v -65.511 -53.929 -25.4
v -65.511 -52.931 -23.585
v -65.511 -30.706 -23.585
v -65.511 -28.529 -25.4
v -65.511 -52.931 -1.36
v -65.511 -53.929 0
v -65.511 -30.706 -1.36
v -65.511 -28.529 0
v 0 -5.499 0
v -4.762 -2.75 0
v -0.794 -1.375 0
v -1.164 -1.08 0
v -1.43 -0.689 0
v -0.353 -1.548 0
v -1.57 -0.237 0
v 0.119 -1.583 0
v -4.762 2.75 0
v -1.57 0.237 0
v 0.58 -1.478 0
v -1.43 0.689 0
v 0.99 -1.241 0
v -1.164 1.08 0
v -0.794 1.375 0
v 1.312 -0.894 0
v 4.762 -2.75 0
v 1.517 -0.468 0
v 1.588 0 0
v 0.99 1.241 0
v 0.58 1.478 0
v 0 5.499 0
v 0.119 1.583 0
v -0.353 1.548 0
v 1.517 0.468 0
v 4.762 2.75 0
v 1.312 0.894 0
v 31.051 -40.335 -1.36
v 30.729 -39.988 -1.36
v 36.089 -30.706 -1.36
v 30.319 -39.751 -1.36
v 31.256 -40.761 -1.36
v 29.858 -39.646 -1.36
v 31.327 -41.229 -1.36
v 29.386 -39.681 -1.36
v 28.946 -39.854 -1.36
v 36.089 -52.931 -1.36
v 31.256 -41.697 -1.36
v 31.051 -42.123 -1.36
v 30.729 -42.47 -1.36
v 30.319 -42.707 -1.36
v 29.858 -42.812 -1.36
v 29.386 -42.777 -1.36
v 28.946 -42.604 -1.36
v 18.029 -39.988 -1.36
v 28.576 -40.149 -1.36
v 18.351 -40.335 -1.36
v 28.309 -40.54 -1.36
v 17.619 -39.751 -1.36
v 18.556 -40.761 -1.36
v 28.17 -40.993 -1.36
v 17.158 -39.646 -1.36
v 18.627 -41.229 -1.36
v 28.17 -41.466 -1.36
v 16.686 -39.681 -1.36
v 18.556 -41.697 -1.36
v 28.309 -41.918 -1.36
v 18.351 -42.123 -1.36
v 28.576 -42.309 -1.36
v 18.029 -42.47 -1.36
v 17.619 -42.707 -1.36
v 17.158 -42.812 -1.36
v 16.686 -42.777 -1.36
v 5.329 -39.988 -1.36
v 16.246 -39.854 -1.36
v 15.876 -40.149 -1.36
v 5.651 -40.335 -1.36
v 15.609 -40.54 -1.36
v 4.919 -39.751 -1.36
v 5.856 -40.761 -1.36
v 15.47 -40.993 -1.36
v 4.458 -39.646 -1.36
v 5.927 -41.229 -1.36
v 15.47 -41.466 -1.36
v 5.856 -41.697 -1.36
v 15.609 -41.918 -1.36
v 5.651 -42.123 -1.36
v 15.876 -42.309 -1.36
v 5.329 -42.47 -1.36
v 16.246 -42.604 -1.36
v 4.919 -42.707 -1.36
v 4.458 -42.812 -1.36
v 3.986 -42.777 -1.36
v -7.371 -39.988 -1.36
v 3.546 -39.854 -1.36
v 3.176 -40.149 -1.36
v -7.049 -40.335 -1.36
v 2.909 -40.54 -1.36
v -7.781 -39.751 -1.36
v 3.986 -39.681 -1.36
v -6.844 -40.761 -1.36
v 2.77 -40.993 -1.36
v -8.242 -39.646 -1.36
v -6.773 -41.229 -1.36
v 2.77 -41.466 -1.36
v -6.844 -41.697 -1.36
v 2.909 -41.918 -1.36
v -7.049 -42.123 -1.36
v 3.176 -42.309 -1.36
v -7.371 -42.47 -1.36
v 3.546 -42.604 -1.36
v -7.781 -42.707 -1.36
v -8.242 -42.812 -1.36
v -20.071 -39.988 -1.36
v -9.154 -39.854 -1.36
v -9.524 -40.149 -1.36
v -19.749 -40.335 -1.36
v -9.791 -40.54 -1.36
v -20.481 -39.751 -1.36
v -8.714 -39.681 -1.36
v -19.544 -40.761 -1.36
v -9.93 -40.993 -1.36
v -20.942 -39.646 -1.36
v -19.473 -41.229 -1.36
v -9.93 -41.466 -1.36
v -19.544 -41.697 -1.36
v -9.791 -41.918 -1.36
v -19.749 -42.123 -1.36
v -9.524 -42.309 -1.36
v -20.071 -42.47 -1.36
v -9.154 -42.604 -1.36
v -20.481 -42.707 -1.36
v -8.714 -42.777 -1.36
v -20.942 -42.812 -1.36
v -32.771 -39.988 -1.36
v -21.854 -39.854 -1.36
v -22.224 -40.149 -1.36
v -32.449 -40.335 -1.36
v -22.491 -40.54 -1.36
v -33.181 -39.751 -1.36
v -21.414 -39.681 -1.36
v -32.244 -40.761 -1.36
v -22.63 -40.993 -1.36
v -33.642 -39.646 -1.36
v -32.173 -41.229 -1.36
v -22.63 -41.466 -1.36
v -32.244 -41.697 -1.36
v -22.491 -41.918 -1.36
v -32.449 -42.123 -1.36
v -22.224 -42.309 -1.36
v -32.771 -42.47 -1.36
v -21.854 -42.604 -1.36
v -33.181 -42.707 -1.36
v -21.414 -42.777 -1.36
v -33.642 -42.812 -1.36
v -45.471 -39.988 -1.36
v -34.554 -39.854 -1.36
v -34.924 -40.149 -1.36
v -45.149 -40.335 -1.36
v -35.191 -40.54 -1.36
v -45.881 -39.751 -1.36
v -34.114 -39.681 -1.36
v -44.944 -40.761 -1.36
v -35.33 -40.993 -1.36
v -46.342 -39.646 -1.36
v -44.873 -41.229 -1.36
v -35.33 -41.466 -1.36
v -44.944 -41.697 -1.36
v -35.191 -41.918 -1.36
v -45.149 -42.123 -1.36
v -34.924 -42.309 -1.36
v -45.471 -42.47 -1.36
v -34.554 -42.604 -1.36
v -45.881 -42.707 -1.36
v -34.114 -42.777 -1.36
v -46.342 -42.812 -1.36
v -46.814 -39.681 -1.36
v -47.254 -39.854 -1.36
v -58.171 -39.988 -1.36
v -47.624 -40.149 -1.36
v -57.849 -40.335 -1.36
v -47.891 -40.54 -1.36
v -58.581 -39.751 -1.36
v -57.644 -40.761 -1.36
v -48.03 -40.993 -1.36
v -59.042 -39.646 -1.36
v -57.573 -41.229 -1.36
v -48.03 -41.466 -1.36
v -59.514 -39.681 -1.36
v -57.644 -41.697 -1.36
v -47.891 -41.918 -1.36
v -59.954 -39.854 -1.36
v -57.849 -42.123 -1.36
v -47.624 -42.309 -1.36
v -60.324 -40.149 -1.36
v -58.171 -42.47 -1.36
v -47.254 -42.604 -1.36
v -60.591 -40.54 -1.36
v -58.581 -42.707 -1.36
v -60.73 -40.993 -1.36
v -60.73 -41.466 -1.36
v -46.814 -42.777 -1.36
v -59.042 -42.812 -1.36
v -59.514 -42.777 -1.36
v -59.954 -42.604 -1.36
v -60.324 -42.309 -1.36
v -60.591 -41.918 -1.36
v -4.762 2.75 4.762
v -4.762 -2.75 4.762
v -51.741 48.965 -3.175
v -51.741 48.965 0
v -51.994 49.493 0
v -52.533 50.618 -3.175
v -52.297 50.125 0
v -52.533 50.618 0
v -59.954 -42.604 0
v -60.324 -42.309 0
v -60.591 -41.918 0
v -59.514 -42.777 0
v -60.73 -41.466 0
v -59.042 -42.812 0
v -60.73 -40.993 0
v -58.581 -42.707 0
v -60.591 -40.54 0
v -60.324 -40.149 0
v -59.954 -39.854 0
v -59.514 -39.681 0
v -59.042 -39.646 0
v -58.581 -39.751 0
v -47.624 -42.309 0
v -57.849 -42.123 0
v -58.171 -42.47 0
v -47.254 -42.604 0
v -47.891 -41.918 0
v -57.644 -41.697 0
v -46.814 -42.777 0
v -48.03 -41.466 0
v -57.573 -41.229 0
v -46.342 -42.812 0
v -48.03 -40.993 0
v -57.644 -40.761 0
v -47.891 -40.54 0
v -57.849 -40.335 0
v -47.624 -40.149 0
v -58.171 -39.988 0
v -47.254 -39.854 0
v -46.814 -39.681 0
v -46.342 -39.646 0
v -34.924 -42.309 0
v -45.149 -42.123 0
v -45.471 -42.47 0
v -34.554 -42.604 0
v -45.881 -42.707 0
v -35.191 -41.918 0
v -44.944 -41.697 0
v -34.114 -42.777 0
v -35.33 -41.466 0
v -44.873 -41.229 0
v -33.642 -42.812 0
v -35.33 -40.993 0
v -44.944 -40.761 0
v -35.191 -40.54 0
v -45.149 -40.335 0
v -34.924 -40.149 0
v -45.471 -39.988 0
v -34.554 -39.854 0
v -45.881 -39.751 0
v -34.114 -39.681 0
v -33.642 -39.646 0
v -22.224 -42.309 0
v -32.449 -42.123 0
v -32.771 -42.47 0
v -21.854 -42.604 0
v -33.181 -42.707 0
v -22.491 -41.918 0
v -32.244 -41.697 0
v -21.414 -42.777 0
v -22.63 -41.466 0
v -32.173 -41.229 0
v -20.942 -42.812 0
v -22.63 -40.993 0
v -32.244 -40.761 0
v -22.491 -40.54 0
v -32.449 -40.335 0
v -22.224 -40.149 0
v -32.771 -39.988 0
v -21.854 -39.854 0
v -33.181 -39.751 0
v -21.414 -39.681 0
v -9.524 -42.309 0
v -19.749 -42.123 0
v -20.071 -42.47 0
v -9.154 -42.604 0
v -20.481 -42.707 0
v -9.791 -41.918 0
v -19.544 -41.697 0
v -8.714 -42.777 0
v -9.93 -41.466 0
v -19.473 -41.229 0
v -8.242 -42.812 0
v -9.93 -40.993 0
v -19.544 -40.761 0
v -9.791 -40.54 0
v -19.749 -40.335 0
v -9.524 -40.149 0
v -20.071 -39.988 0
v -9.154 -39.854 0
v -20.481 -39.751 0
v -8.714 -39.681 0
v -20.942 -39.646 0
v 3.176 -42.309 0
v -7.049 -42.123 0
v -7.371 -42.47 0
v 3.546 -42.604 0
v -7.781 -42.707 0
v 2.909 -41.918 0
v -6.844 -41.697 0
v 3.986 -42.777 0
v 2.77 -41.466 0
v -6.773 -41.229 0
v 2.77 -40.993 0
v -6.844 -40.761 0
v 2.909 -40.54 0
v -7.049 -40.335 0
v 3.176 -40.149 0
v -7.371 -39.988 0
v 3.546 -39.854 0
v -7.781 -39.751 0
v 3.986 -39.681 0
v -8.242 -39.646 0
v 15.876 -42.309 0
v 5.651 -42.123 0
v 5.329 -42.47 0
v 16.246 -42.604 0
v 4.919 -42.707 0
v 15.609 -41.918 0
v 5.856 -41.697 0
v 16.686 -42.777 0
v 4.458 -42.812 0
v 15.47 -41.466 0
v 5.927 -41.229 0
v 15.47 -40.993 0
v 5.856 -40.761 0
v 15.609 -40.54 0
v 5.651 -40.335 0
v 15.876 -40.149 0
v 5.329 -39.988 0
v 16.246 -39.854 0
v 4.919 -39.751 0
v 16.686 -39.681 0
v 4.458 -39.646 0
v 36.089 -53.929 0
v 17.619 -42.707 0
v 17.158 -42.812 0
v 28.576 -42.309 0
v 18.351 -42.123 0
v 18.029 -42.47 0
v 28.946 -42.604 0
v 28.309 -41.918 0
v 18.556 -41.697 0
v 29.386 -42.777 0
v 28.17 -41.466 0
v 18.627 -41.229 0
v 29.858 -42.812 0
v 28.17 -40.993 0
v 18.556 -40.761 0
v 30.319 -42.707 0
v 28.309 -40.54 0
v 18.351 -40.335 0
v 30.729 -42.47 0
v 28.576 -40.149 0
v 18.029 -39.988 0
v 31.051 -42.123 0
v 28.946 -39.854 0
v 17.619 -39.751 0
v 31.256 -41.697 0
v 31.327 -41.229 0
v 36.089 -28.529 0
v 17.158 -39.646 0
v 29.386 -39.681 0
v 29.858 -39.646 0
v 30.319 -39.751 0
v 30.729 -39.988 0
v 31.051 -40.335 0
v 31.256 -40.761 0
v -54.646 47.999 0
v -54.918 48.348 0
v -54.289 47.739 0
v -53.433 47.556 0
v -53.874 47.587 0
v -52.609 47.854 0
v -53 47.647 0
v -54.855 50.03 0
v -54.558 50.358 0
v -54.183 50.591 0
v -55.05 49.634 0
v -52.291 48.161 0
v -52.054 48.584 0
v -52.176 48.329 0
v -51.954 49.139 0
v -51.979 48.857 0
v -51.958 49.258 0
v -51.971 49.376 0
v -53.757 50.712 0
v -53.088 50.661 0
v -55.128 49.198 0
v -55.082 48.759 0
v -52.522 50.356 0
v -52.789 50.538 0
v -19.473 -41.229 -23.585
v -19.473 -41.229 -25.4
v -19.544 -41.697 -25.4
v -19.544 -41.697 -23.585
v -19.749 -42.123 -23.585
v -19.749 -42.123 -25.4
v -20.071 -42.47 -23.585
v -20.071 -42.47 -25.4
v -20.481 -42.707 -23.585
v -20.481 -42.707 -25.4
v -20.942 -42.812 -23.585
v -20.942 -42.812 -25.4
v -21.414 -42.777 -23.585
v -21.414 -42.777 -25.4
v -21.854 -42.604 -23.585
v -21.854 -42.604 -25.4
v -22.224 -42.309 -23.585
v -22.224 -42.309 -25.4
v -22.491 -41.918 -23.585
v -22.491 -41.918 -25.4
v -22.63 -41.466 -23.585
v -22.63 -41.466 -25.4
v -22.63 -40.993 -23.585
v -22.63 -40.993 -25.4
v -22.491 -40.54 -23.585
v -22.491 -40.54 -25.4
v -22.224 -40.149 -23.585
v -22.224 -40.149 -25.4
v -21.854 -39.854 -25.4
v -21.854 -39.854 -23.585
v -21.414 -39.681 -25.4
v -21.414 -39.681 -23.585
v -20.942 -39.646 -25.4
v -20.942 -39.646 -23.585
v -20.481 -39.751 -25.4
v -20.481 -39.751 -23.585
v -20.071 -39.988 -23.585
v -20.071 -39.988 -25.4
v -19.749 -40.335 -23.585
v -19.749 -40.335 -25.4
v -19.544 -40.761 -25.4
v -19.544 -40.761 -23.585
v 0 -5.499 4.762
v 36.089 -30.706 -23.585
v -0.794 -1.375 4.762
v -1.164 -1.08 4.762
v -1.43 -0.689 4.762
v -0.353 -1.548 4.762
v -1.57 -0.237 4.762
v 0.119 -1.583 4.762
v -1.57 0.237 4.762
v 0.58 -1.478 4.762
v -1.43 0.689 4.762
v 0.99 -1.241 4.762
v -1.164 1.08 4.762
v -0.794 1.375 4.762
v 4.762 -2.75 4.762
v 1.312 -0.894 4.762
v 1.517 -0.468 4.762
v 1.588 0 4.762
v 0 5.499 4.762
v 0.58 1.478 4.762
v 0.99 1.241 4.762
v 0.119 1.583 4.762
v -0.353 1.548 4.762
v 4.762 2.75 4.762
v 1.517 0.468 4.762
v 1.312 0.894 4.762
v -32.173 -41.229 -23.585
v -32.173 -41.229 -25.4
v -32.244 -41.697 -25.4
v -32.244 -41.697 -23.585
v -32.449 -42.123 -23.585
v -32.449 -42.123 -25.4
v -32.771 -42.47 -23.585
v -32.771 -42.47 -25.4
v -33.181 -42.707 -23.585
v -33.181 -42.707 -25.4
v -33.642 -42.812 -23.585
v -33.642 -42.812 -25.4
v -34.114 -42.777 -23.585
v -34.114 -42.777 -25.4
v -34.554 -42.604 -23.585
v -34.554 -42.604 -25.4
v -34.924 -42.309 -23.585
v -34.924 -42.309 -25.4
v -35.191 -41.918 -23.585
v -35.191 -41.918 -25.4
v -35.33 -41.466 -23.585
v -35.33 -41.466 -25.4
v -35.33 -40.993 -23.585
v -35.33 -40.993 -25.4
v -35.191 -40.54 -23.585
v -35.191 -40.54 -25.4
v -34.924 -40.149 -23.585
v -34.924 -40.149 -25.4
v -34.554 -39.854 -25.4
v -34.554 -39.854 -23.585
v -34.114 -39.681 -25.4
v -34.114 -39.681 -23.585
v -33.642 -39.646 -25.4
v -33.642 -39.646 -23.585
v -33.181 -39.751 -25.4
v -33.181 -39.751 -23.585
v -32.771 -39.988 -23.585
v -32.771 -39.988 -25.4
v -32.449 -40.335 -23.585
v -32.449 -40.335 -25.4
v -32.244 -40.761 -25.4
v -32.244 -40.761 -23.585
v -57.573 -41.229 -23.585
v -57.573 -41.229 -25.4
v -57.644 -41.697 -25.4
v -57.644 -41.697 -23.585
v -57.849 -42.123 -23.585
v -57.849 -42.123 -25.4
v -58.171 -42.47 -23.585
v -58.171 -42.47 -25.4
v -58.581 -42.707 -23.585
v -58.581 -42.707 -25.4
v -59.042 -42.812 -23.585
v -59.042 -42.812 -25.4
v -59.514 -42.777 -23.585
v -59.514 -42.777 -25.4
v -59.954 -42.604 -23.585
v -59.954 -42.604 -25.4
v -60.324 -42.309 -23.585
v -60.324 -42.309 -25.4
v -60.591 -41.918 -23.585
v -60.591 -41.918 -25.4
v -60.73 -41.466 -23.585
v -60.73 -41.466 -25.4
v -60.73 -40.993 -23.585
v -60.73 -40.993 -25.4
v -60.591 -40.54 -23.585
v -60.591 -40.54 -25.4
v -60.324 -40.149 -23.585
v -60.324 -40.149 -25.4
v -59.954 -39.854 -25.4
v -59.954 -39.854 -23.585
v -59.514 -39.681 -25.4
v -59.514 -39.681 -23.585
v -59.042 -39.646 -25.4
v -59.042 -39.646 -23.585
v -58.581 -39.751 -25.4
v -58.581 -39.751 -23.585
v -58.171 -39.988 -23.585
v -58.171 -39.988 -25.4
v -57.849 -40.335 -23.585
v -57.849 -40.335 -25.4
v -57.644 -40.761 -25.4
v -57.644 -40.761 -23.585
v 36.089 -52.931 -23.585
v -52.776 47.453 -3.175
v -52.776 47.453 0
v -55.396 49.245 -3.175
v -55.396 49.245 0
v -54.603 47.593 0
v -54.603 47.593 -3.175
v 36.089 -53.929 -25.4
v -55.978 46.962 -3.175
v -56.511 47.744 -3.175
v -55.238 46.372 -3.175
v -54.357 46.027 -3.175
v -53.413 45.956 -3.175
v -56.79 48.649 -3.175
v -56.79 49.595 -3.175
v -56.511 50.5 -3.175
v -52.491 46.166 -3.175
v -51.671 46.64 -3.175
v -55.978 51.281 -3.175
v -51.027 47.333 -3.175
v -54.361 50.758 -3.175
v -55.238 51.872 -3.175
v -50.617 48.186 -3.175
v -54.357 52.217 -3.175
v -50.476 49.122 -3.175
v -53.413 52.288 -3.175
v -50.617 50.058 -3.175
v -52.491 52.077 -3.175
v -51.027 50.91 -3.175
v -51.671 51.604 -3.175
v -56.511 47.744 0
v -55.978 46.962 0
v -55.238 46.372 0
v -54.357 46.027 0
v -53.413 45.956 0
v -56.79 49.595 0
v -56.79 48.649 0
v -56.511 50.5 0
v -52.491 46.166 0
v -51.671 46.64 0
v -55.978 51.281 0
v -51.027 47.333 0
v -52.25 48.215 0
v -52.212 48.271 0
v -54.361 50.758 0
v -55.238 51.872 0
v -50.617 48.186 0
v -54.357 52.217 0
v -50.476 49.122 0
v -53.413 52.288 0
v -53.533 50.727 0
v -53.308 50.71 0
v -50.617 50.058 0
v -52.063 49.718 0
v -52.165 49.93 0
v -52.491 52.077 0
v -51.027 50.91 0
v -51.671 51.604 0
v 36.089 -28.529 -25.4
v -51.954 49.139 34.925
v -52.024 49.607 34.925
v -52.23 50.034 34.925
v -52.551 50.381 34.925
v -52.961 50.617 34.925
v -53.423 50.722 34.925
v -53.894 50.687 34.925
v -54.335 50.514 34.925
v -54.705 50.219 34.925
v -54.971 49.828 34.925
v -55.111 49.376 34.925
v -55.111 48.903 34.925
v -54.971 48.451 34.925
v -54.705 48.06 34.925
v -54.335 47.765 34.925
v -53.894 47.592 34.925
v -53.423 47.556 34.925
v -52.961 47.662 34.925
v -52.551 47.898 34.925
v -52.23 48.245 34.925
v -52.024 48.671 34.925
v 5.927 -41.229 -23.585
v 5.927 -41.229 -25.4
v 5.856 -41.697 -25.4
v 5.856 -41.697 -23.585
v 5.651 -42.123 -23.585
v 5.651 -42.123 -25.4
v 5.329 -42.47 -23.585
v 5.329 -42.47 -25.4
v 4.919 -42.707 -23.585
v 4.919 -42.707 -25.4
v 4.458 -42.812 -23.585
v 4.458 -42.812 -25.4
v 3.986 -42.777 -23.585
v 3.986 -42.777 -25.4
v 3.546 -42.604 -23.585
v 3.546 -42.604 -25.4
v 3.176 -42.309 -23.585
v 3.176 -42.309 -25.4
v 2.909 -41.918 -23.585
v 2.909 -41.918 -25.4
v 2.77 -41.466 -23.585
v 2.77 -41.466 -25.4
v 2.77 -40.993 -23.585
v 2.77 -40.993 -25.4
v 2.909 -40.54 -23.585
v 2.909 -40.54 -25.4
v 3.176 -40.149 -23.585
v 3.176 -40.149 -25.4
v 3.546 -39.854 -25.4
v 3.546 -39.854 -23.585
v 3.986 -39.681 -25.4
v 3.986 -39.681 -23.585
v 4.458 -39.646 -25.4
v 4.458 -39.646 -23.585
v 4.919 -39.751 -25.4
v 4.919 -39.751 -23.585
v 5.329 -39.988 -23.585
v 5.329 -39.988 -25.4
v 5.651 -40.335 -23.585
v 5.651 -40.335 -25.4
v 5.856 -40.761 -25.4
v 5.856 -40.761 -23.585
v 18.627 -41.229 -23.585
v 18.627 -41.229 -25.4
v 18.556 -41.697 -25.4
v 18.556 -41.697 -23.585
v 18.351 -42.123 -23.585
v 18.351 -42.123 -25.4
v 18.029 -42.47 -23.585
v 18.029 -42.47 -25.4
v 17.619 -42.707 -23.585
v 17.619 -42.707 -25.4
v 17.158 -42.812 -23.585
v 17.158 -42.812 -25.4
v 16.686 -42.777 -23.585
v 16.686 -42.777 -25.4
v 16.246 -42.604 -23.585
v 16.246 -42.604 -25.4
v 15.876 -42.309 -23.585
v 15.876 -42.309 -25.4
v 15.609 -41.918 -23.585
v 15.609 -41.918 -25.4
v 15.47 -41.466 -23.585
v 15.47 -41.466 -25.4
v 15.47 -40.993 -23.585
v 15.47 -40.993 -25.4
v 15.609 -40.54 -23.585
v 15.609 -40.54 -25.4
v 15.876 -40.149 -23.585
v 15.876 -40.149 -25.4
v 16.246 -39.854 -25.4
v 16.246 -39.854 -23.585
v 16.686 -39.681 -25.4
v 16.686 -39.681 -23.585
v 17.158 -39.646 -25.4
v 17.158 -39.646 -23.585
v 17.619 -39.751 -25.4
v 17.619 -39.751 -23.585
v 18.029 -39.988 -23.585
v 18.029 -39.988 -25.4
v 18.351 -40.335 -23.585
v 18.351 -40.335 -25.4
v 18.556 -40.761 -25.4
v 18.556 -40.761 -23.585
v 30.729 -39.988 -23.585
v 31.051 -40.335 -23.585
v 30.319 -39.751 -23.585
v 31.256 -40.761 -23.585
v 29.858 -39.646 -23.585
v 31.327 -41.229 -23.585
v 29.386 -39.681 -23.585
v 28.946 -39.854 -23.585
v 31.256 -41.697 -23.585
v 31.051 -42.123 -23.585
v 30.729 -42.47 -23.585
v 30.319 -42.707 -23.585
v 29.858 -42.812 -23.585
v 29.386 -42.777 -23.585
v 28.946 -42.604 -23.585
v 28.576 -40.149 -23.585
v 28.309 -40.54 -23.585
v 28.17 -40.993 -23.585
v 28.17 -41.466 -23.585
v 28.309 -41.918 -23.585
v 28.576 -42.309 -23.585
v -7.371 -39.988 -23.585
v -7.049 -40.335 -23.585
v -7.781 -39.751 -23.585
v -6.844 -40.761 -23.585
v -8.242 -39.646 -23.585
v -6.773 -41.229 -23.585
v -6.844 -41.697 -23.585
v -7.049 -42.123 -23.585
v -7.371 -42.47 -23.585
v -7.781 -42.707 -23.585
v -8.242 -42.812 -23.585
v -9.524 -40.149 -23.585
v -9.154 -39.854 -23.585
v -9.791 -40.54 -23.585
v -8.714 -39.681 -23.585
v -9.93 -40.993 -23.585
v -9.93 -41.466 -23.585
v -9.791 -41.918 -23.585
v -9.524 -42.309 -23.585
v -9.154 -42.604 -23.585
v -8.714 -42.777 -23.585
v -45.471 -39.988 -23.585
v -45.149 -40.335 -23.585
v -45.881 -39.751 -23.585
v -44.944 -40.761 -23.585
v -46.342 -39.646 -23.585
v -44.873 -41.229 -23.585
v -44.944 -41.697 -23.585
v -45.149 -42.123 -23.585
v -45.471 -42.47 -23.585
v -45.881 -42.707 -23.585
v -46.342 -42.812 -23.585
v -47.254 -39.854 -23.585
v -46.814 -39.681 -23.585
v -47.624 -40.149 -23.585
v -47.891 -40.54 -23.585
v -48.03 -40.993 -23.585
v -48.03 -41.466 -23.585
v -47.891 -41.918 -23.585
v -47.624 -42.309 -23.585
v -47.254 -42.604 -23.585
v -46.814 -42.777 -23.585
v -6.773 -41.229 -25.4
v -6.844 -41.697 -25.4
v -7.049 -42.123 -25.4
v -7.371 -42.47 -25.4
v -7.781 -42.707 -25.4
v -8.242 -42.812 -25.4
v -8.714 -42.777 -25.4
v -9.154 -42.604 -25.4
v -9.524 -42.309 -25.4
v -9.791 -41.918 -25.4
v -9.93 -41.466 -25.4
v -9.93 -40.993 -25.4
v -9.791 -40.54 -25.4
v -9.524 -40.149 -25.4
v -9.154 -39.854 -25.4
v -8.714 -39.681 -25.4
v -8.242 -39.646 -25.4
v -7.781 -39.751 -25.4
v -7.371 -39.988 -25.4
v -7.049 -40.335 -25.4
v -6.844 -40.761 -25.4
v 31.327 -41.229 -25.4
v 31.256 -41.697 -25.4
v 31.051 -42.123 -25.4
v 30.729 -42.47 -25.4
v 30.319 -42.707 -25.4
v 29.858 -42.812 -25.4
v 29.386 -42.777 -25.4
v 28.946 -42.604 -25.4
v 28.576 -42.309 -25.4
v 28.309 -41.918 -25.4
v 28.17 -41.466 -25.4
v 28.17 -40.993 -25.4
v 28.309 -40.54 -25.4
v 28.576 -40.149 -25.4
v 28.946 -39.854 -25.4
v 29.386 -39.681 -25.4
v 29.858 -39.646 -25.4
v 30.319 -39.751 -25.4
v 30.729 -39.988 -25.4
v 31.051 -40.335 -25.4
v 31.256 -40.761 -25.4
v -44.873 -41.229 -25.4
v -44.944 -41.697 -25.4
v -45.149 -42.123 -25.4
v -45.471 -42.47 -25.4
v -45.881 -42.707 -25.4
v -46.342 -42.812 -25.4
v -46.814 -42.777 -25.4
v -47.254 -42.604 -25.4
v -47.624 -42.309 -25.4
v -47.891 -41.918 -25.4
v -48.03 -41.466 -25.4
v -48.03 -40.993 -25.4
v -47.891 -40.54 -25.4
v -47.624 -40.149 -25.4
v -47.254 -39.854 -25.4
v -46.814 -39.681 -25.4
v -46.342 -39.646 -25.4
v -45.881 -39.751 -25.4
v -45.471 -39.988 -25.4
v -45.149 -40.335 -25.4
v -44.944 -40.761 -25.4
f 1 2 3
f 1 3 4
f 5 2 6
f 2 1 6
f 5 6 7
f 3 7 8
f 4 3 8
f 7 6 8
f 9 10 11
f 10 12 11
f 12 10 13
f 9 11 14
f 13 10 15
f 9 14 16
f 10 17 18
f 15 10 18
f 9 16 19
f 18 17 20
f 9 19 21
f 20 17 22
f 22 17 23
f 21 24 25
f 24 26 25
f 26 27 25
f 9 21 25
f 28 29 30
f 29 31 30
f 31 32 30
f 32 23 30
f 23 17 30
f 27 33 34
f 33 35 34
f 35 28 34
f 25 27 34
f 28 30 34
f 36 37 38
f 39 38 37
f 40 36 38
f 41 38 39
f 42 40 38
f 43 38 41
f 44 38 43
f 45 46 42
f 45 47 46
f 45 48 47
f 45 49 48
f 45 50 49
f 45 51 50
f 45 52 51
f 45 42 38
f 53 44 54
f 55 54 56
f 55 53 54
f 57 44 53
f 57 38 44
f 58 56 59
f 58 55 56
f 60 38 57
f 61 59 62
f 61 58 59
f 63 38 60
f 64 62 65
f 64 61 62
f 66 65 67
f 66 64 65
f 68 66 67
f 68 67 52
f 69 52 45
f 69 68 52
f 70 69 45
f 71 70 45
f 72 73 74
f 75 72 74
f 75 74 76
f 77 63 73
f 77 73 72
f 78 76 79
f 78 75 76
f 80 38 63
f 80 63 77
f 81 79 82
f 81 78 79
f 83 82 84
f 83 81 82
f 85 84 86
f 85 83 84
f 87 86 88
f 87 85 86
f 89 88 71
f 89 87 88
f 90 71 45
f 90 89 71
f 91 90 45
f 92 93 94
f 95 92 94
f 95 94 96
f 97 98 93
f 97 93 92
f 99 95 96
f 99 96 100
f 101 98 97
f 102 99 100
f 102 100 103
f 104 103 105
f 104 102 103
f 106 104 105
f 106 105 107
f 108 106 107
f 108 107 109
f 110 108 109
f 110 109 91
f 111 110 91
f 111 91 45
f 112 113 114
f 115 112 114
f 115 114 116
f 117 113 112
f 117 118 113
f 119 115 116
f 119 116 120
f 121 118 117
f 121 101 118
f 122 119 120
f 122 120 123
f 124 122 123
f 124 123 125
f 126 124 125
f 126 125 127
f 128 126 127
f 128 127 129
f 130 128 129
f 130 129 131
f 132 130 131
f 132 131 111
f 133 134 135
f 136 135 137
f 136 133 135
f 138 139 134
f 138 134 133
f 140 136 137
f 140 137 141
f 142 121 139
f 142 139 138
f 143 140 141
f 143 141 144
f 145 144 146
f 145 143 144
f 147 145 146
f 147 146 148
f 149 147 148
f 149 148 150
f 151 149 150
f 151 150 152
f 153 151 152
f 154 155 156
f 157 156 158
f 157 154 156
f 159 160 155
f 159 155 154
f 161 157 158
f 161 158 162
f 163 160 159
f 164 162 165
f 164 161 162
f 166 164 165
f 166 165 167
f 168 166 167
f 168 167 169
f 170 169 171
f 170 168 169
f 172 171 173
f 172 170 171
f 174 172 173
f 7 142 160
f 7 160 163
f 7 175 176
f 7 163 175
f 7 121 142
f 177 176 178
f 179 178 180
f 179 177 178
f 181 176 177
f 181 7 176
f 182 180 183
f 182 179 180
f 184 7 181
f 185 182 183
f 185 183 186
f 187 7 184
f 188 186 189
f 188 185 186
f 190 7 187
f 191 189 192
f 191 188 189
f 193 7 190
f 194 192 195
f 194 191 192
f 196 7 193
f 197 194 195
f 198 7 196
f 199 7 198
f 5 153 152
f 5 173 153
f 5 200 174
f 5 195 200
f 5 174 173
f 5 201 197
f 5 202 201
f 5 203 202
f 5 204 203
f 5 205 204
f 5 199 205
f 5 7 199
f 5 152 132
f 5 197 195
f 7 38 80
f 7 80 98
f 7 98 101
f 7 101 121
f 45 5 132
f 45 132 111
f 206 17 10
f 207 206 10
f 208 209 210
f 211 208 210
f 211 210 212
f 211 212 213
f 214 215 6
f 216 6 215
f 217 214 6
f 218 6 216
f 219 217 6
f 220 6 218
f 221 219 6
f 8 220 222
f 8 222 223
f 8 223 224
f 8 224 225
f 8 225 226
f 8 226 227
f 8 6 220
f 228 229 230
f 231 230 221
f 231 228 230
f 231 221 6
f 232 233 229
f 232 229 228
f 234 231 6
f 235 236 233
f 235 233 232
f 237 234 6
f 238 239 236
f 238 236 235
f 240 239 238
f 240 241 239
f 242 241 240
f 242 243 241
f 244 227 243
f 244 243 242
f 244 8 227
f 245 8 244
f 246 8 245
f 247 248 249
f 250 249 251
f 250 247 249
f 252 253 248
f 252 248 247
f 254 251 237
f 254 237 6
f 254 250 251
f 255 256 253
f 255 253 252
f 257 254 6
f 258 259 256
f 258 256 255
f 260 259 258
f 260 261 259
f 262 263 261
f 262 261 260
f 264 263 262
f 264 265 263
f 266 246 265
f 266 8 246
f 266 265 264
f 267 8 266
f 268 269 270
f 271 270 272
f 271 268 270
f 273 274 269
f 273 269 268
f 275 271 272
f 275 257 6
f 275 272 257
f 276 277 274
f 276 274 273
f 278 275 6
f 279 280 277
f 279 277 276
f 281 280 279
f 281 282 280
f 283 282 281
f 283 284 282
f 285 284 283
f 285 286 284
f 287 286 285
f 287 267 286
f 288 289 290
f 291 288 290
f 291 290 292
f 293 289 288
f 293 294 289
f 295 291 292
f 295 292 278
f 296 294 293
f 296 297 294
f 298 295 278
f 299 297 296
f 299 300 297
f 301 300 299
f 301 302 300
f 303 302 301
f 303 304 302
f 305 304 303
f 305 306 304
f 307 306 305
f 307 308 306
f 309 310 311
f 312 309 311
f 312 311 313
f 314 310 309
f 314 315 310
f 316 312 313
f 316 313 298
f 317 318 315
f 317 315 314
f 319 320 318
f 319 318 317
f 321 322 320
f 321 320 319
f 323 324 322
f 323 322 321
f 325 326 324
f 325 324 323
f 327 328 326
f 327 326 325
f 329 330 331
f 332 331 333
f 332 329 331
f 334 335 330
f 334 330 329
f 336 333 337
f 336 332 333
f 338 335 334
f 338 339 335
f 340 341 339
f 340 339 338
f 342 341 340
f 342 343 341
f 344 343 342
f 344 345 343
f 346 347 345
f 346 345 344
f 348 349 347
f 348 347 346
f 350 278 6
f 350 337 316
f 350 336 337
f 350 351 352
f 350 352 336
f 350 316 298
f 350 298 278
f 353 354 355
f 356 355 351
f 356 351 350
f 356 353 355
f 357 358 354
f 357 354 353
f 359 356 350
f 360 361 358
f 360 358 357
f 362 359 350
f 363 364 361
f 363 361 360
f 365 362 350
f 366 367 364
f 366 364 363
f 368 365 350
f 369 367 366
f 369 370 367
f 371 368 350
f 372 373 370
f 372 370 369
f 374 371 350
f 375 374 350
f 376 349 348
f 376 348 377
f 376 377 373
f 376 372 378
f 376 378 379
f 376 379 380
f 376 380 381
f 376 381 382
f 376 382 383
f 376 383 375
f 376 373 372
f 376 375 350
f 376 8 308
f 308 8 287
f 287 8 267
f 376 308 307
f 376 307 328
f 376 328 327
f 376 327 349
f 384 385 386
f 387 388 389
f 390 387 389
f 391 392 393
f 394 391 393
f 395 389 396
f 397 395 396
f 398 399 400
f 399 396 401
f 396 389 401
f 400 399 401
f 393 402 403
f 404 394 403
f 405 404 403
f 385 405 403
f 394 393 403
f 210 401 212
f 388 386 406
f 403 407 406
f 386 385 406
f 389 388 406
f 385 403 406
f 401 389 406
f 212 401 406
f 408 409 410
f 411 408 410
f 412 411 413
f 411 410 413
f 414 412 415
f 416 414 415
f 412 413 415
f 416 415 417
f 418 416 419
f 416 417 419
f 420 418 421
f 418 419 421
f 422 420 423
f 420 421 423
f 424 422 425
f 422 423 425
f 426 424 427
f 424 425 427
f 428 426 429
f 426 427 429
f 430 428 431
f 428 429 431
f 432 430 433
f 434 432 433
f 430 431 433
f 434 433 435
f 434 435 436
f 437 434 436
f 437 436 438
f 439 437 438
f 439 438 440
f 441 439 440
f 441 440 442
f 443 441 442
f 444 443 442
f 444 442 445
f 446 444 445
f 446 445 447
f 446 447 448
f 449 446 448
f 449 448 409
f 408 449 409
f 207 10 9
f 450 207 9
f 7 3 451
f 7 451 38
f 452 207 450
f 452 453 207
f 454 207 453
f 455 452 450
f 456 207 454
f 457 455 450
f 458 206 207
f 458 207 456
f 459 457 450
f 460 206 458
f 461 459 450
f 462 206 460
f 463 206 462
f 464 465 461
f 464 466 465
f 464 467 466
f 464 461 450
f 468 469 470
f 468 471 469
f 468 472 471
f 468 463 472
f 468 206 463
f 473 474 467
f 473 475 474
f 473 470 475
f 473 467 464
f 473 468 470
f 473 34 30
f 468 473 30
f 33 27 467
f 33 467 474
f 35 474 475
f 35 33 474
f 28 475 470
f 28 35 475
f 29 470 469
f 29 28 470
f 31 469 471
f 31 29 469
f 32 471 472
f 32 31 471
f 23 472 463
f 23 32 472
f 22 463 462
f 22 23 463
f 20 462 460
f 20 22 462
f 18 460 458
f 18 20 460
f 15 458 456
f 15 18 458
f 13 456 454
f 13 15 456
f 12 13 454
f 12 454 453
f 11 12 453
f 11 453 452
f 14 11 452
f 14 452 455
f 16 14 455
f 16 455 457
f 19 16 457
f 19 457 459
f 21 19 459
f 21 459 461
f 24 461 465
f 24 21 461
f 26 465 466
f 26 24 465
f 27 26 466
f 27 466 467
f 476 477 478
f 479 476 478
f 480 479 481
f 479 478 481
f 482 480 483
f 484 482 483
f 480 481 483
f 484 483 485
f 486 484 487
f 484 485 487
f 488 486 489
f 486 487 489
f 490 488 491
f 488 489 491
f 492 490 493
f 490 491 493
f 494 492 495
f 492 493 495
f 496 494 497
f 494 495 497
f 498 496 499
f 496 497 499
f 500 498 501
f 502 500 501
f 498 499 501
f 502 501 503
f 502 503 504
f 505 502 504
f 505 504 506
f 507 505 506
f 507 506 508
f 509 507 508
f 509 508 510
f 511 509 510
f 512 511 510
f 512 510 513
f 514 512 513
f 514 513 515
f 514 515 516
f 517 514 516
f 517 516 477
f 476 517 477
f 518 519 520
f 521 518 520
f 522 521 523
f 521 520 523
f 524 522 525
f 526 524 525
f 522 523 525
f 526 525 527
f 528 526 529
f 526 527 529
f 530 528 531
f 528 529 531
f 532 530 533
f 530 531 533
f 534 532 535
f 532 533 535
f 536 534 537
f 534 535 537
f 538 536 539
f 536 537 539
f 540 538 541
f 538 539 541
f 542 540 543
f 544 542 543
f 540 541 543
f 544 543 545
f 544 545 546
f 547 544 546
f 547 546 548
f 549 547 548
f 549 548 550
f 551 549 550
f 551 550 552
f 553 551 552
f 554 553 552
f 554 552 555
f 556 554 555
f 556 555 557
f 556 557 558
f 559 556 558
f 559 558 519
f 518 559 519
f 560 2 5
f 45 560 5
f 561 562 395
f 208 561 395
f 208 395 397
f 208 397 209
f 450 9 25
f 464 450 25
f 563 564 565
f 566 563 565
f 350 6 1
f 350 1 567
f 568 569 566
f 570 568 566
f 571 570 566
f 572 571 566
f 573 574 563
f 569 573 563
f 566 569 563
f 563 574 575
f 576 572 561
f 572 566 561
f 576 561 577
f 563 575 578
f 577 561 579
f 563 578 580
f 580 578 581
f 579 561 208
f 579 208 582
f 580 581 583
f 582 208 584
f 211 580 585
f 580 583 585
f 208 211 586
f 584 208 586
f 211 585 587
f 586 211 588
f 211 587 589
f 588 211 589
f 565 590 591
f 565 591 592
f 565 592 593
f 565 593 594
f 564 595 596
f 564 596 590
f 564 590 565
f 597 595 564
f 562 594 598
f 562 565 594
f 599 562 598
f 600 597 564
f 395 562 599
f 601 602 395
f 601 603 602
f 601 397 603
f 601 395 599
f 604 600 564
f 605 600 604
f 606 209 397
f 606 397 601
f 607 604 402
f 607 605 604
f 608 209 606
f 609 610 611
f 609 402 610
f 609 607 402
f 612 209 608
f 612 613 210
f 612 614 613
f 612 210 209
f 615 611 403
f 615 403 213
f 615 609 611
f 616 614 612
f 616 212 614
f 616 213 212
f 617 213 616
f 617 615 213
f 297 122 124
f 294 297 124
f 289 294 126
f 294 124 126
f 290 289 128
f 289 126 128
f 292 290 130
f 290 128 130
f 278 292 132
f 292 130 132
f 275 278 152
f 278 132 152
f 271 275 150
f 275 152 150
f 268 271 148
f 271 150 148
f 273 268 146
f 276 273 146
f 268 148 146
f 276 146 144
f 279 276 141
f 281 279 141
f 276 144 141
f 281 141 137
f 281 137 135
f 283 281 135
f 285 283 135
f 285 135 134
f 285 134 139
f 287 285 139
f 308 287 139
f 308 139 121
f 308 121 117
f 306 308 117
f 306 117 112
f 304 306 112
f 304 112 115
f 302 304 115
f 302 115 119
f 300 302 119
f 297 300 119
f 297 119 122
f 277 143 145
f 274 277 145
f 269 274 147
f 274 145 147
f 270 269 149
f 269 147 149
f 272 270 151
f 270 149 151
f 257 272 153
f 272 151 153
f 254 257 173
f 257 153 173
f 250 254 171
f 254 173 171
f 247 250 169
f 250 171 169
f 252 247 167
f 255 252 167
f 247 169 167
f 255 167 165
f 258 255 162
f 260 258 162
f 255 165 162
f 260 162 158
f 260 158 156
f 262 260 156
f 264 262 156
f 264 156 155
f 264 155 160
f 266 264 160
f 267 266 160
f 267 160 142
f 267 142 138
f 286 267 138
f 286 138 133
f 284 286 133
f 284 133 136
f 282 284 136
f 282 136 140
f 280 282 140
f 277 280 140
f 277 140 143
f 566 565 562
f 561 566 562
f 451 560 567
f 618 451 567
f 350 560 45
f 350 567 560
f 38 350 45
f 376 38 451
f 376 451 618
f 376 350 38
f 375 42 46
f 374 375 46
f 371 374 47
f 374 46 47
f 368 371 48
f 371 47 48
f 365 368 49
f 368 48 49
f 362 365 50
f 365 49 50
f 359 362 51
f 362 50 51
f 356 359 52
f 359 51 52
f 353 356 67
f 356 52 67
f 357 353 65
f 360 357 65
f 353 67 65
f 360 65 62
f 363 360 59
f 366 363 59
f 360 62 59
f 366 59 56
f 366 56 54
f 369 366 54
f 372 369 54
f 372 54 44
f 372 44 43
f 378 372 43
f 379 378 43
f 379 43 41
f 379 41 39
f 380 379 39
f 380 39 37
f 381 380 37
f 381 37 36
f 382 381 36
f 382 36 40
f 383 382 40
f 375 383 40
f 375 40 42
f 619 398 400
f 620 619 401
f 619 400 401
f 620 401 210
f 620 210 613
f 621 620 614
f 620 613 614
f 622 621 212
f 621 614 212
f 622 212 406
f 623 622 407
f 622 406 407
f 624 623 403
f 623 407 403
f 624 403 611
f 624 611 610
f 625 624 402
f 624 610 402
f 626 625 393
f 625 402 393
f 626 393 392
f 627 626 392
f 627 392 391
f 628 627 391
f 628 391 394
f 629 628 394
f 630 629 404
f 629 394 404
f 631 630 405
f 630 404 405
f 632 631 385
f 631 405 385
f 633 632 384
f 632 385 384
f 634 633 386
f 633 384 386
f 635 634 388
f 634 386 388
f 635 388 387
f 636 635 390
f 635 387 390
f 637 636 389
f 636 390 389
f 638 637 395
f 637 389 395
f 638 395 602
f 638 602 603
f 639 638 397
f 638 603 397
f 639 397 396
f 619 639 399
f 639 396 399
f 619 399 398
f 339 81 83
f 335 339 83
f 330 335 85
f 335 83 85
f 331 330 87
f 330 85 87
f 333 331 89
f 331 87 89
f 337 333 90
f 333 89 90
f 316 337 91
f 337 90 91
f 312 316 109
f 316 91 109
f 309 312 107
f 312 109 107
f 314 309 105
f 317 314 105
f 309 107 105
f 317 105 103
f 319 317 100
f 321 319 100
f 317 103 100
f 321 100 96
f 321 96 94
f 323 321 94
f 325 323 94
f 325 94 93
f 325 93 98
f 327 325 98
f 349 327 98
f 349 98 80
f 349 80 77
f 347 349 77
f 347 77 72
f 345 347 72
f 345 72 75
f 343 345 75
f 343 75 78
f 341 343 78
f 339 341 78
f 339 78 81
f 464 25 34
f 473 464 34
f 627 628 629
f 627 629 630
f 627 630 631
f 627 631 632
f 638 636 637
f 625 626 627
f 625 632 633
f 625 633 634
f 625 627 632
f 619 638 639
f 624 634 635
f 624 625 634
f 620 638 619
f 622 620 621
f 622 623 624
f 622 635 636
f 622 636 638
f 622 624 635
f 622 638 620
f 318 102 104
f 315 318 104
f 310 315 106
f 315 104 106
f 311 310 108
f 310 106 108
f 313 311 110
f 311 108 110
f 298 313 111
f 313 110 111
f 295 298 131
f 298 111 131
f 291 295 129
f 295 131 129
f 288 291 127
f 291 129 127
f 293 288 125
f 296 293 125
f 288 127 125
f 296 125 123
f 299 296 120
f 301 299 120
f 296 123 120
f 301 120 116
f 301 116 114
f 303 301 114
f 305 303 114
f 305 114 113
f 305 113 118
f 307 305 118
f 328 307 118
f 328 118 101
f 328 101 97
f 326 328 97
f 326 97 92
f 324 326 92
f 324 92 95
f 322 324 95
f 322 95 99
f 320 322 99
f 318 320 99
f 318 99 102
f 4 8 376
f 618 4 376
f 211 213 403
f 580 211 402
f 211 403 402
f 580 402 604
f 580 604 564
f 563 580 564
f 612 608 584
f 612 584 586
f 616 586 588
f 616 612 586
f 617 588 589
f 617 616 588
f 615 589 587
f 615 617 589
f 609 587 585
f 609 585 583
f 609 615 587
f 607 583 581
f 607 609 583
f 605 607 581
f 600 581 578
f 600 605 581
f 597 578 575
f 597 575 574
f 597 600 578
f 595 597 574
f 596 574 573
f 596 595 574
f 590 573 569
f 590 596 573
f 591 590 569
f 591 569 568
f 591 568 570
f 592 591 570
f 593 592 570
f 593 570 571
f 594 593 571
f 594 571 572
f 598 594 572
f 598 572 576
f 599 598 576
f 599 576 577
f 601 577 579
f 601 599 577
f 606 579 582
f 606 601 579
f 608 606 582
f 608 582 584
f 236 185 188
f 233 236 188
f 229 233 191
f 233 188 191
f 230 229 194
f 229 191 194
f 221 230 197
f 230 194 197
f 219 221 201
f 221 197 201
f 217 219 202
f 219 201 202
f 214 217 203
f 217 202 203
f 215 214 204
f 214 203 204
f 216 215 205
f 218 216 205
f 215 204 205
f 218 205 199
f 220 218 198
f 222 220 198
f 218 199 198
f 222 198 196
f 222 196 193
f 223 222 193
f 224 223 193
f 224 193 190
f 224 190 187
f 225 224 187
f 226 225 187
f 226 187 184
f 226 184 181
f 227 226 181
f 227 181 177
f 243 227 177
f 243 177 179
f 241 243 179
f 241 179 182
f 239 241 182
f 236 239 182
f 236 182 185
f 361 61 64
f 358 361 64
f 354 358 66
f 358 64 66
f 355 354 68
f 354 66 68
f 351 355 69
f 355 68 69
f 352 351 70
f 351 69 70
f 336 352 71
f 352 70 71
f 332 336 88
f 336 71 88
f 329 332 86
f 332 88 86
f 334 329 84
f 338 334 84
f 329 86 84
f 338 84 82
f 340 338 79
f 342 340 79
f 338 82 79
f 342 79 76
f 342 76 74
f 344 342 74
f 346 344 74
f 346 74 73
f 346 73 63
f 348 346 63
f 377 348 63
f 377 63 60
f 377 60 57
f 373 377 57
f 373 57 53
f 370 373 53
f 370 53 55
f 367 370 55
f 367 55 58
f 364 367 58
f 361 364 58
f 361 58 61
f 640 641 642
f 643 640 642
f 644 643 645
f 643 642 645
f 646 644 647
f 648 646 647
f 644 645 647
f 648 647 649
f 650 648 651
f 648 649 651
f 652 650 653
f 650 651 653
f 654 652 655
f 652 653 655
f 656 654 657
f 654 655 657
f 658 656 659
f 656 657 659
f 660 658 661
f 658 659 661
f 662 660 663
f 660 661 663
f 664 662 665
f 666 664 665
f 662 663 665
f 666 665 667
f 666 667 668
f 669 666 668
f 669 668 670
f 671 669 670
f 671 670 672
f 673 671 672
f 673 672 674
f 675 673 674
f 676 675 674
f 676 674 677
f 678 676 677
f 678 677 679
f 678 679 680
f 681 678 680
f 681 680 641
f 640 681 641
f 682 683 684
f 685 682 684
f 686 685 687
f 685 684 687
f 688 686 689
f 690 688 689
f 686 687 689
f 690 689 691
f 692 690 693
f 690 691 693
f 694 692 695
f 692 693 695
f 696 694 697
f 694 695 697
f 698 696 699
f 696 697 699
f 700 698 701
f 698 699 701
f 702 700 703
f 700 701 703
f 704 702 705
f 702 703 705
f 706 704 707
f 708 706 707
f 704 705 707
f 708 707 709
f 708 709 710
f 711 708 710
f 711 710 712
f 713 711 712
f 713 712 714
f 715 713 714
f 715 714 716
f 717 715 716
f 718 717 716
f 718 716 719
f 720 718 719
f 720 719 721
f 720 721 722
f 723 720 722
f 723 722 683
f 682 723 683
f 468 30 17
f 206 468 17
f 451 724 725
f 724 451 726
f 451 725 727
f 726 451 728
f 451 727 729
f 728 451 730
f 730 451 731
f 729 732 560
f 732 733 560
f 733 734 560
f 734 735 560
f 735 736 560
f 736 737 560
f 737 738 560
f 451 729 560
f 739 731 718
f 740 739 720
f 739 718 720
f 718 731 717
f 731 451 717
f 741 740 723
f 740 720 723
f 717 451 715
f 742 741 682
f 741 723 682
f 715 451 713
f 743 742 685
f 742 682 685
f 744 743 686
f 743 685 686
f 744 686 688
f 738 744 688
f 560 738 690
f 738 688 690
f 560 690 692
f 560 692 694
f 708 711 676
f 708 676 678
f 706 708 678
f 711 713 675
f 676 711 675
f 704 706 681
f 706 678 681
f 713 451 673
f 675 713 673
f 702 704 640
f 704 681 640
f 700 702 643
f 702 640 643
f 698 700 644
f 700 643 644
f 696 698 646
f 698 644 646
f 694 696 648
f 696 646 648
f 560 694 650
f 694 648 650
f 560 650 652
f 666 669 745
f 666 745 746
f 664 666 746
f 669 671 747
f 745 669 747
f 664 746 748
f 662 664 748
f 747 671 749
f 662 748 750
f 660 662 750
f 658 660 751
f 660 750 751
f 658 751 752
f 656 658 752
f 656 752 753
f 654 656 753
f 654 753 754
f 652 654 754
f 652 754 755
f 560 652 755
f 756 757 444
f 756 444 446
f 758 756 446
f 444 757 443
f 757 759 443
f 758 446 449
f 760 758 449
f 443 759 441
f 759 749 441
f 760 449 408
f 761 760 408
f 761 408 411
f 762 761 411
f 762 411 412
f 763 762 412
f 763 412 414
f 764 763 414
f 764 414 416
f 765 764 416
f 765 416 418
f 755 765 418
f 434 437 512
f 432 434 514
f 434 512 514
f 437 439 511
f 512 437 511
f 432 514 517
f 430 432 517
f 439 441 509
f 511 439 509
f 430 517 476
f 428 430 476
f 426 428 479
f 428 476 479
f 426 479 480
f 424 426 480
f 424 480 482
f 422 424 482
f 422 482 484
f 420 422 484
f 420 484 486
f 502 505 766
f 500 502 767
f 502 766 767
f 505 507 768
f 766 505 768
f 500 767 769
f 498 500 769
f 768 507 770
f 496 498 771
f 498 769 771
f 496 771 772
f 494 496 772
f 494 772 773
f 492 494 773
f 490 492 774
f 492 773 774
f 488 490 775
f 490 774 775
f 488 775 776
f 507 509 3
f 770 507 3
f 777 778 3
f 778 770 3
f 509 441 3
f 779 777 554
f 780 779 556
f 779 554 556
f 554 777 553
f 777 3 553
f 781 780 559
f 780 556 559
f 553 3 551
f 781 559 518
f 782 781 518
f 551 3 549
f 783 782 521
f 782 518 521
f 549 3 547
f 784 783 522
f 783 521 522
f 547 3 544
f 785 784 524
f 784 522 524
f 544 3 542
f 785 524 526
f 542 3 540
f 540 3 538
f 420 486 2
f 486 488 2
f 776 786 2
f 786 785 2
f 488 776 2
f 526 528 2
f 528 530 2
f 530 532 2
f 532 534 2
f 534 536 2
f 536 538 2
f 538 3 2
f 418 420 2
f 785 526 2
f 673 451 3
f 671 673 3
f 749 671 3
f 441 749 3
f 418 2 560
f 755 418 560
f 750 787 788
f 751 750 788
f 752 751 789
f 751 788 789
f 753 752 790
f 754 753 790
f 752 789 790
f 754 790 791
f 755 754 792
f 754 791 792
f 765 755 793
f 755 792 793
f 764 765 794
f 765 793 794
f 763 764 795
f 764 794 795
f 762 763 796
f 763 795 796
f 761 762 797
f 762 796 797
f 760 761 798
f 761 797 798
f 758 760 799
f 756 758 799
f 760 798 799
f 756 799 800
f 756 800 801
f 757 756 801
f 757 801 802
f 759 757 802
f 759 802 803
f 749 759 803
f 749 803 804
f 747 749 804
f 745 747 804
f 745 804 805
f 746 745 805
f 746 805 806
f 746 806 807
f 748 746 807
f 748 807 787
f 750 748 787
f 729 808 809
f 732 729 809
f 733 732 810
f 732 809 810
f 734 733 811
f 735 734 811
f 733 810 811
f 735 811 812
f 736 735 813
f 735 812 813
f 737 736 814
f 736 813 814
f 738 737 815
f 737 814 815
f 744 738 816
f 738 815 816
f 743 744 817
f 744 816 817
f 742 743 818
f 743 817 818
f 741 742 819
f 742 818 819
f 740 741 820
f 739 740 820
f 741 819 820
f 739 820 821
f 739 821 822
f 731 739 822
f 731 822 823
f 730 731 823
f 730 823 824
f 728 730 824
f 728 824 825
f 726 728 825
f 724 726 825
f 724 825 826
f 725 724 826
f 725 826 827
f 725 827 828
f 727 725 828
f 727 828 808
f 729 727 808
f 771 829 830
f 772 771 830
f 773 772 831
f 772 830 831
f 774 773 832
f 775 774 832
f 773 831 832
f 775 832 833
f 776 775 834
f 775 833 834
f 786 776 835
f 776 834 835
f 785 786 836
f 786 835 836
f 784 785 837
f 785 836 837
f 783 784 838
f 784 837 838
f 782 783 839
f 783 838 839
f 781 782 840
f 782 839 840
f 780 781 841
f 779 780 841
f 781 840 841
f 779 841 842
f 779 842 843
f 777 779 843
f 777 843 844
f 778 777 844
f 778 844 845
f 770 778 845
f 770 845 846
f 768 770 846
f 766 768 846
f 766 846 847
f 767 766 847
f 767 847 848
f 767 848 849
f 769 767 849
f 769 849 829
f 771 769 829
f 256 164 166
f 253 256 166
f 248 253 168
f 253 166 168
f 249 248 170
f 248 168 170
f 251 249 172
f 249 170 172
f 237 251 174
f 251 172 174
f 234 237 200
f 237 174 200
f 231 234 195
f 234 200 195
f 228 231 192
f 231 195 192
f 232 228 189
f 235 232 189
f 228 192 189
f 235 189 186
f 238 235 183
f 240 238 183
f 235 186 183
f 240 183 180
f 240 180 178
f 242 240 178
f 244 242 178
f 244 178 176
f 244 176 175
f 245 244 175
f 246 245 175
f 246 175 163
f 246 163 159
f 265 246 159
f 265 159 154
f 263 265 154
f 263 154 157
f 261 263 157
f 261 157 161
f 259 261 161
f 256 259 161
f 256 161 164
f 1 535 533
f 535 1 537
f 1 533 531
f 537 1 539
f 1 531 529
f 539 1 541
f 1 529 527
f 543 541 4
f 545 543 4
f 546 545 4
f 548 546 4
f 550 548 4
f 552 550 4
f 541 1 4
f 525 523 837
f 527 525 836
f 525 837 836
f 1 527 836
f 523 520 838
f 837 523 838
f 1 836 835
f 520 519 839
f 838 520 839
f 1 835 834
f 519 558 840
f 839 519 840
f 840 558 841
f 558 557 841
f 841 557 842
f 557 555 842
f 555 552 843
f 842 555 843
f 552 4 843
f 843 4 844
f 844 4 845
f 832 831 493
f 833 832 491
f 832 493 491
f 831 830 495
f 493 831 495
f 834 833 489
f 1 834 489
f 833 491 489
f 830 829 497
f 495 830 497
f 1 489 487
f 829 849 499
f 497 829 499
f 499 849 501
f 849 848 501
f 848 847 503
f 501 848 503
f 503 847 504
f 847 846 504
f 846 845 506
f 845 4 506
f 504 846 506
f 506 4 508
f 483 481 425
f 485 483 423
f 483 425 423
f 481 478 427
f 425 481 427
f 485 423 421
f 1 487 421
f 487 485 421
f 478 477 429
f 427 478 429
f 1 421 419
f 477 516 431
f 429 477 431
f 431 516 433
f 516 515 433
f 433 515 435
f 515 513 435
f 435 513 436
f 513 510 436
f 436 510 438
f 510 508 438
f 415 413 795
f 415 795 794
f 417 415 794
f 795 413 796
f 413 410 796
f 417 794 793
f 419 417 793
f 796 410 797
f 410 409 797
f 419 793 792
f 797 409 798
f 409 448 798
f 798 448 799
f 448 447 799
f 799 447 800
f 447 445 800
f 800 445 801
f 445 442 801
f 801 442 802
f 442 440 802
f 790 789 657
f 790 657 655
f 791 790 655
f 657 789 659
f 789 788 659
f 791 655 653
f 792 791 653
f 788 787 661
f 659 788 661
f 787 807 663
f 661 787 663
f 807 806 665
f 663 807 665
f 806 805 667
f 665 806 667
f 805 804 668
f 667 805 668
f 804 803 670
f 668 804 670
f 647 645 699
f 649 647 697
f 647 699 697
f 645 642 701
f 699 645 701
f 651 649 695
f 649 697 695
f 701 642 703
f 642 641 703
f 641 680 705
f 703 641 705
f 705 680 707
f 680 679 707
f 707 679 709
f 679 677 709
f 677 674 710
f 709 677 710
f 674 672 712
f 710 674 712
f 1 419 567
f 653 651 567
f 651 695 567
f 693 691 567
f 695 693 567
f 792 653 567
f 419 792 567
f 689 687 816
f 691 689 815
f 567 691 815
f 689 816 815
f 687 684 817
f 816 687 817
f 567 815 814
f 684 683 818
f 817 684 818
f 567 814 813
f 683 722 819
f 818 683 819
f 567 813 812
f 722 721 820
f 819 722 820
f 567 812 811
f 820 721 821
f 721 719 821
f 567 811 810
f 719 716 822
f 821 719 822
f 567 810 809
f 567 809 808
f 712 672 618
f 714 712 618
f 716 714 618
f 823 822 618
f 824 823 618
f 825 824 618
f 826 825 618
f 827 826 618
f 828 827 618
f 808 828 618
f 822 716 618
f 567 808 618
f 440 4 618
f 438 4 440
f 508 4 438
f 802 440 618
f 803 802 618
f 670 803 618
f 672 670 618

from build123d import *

# Parameters (mm, degrees)
F0_R      = 1.5875
F1_DEPTH  = 4.7625
F2_R      = 1.5875
F3_DEPTH  = 34.925
F4_R      = 3.175
F5_DEPTH  = 3.175
F7_DEPTH  = 3.175
F8_W      = 101.6
F8_H      = 25.4
F9_DEPTH  = 25.4
F10_W     = 22.225
F10_H     = 22.225
F11_DEPTH = 101.6
F12_R     = 1.5875
F13_DEPTH = 25.4


with BuildPart() as f1:
    # F0 (on Top) → F1 (new body)
    with BuildSketch(Plane.XY):
        Polygon((-4.7625, 2.749631), (-4.7625, -2.749631), (0, -5.499261), (4.7625, -2.749631), (4.7625, 2.749631), (0, 5.499261), align=None)
        Circle(F0_R, mode=Mode.SUBTRACT)
    extrude(amount=F1_DEPTH)


with BuildPart() as f3:
    # F2 (on Top) → F3 (new body)
    with BuildSketch(Plane.XY):
        with Locations((-53.541165, 49.139366)):
            Circle(F2_R)
    extrude(amount=F3_DEPTH)

    # F4 (on Top) → F5 (join)
    with BuildSketch(Plane.XY):
        with Locations((-53.650584, 49.121924)):
            Circle(F4_R)
    extrude(amount=-F5_DEPTH)

    # F6 (on Top) → F7 (cut)
    with BuildSketch(Plane.XY):
        Polygon((-54.360942, 50.758298), (-55.396058, 49.245439), (-54.603442, 47.592573), (-52.77571, 47.452565), (-51.740593, 48.965424), (-52.53321, 50.618291), align=None)
    extrude(amount=-F7_DEPTH, mode=Mode.SUBTRACT)


with BuildPart() as f9:
    # F8 (on Top) → F9 (new body)
    with BuildSketch(Plane.XY):
        with Locations((-14.710551, -41.229142)):
            Rectangle(F8_W, F8_H)
    extrude(amount=-F9_DEPTH)

    # F10 (on face) → F11 (cut)
    with BuildSketch(Plane(origin=(-65.510551, 0, 0), x_dir=(0, -1, 0), z_dir=(-1, 0, 0))):
        with Locations((41.818157, -12.472743)):
            Rectangle(F10_W, F10_H)
    extrude(amount=-F11_DEPTH, mode=Mode.SUBTRACT)

    # F12 (on face) → F13 (cut)
    with BuildSketch(Plane(origin=(0, 0, -25.4), x_dir=(1, 0, 0), z_dir=(0, 0, -1))):
        with Locations((-59.160551, 41.229142)):
            Circle(F12_R)
        with Locations((-46.460551, 41.229142)):
            Circle(F12_R)
        with Locations((-33.760551, 41.229142)):
            Circle(F12_R)
        with Locations((-21.060551, 41.229142)):
            Circle(F12_R)
        with Locations((-8.360551, 41.229142)):
            Circle(F12_R)
        with Locations((4.339449, 41.229142)):
            Circle(F12_R)
        with Locations((17.039449, 41.229142)):
            Circle(F12_R)
        with Locations((29.739449, 41.229142)):
            Circle(F12_R)
    extrude(amount=-F13_DEPTH, mode=Mode.SUBTRACT)


solid = Compound([f1.part, f3.part, f9.part])
